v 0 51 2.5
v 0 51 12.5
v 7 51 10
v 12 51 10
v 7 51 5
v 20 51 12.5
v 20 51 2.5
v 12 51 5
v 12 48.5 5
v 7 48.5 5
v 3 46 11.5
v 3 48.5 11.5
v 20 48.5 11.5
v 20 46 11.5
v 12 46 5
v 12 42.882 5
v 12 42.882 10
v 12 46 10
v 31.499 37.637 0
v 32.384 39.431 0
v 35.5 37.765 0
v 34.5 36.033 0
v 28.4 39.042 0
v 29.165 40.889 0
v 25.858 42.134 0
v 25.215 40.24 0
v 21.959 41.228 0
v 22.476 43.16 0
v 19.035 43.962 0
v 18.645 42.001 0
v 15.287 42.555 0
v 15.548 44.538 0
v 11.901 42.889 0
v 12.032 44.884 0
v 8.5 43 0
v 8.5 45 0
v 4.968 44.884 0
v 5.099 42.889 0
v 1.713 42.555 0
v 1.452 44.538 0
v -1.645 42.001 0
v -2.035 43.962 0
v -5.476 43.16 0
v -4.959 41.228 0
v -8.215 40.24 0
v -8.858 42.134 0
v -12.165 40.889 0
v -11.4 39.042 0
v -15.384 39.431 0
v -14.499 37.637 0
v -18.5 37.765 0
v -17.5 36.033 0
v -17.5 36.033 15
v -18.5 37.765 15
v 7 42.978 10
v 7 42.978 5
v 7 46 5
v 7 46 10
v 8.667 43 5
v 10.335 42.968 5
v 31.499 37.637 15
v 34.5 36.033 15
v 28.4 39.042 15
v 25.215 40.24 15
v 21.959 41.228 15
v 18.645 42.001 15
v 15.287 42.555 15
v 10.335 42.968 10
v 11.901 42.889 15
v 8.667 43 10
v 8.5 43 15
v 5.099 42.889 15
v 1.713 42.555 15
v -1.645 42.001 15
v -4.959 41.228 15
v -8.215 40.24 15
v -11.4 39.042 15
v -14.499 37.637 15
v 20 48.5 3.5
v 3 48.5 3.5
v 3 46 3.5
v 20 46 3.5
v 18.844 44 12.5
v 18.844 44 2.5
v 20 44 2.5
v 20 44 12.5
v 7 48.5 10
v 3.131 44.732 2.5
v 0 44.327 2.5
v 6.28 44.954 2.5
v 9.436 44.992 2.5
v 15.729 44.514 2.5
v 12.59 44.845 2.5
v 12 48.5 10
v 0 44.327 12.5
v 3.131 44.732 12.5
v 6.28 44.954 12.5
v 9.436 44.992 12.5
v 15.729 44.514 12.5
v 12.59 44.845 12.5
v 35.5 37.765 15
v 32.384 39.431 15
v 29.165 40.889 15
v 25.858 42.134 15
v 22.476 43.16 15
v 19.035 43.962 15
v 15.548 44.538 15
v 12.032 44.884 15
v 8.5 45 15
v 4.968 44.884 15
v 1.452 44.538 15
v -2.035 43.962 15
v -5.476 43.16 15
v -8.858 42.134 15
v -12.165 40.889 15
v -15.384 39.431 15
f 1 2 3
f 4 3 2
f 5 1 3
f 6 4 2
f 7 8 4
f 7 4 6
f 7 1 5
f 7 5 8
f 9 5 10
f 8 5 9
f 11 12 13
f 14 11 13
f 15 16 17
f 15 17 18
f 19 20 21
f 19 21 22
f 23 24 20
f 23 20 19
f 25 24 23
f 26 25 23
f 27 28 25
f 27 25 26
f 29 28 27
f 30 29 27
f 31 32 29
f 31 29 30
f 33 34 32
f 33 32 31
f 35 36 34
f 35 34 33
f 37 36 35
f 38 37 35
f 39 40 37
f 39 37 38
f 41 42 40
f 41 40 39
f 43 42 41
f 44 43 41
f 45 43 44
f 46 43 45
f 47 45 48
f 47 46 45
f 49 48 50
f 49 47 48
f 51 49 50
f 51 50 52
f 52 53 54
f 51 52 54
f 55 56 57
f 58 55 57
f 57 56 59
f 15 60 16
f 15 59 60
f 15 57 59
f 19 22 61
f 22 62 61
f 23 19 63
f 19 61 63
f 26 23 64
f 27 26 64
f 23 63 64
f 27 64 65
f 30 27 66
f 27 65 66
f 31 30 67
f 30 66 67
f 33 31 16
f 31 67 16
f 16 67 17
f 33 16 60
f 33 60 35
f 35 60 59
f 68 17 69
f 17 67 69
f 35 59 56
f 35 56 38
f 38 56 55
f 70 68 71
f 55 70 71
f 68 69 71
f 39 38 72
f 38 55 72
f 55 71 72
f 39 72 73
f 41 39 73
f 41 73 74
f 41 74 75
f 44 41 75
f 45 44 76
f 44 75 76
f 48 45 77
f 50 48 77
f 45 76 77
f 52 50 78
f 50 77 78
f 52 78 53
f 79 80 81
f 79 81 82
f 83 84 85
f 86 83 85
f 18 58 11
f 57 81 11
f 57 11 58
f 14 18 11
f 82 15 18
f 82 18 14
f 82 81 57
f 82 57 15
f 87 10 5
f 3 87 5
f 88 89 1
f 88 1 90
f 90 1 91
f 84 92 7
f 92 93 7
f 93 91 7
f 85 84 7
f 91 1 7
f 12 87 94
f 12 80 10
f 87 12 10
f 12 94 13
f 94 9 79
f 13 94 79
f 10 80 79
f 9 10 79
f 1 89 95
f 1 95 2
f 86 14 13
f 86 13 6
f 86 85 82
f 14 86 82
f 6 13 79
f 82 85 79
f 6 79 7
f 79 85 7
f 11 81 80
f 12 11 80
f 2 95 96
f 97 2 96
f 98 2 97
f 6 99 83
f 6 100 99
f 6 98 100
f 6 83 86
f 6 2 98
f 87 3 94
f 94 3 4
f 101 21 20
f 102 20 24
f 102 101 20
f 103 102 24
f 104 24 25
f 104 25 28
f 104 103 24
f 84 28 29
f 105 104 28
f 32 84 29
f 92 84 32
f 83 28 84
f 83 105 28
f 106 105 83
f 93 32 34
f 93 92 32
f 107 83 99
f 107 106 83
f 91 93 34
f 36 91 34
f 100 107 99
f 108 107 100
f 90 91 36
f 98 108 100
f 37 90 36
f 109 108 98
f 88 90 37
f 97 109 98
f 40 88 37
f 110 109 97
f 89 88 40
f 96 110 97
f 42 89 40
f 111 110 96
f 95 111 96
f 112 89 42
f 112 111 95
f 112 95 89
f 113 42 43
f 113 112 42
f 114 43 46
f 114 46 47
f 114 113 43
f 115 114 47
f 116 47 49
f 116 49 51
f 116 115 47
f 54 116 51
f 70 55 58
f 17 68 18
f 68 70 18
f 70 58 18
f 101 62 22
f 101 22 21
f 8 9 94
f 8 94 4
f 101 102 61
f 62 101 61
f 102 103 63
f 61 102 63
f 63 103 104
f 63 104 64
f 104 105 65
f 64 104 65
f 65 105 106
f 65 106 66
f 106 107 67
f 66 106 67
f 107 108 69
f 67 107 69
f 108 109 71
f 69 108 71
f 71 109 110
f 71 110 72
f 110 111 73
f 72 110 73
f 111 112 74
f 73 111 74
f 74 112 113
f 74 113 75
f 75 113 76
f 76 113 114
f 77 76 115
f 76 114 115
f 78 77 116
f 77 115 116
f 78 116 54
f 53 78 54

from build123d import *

# Parameters (mm, degrees)
BOX002_W                    = 20
BOX002_H                    = 2.5
BOX002_DEPTH                = 8
BOX_W                       = 5
BOX_H                       = 20
BOX_DEPTH                   = 5
BOX001_W                    = 20
BOX001_H                    = 7
BOX001_DEPTH                = 10
CYLINDER001_W               = 52
CYLINDER001_H               = 15
CYLINDER001_ANGLE           = 60
CYLINDER001_PLACEMENT_ANGLE = 60
CYLINDER_W                  = 54
CYLINDER_H                  = 15
CYLINDER_ANGLE              = 60
CYLINDER_PLACEMENT_ANGLE    = 60


with BuildPart() as slot:
    # Box002 → Box002 (new body)
    with BuildSketch(Plane(origin=(3, 46, 3.5), x_dir=(1, 0, 0), z_dir=(0, 0, 1))):
        with Locations((10, 1.25)):
            Rectangle(BOX002_W, BOX002_H)
    extrude(amount=BOX002_DEPTH)


with BuildPart() as pin_opening:
    # Box → Box (new body)
    with BuildSketch(Plane(origin=(7, 42, 5), x_dir=(1, 0, 0), z_dir=(0, 0, 1))):
        with Locations((2.5, 10)):
            Rectangle(BOX_W, BOX_H)
    extrude(amount=BOX_DEPTH)


with BuildPart() as latch:
    # Box001 → Box001 (new body)
    with BuildSketch(Plane(origin=(0, 44, 2.5), x_dir=(1, 0, 0), z_dir=(0, 0, 1))):
        with Locations((10, 3.5)):
            Rectangle(BOX001_W, BOX001_H)
    extrude(amount=BOX001_DEPTH)


with BuildPart() as bottle_wall001:
    # Cylinder001 → Cylinder001 (revolve)
    with BuildSketch(Plane.XZ):
        with Locations((26, 7.5)):
            Rectangle(CYLINDER001_W, CYLINDER001_H)
    revolve(axis=Axis((0, 0, 0), (0, 0, 1)), revolution_arc=CYLINDER001_ANGLE)


with BuildPart() as bottle_wall001_1:
    # Cylinder001 placement: moved
    add(bottle_wall001.part.moved(Location((8.5, -7, 0))).rotate(Axis((8.5, -7, 0), (0, 0, 1)), CYLINDER001_PLACEMENT_ANGLE))


with BuildPart() as cut002:
    # Cylinder → Cylinder (revolve)
    with BuildSketch(Plane.XZ):
        with Locations((27, 7.5)):
            Rectangle(CYLINDER_W, CYLINDER_H)
    revolve(axis=Axis((0, 0, 0), (0, 0, 1)), revolution_arc=CYLINDER_ANGLE)


with BuildPart() as cut002_1:
    # Cylinder placement: moved
    add(cut002.part.moved(Location((8.5, -7, 0))).rotate(Axis((8.5, -7, 0), (0, 0, 1)), CYLINDER_PLACEMENT_ANGLE))

    # Cut: cut bottle_wall001
    add(bottle_wall001_1.part, mode=Mode.SUBTRACT)


with BuildPart() as cut002_2:
    # Cut placement: moved
    add(cut002_1.part.moved(Location((0, -2, 0))))

    # Fusion: union latch
    add(latch.part)

    # Fusion001: union latch
    add(latch.part)

    # Cut001: cut pin_opening
    add(pin_opening.part, mode=Mode.SUBTRACT)

    # Cut002: cut slot
    add(slot.part, mode=Mode.SUBTRACT)


solid = cut002_2.part
